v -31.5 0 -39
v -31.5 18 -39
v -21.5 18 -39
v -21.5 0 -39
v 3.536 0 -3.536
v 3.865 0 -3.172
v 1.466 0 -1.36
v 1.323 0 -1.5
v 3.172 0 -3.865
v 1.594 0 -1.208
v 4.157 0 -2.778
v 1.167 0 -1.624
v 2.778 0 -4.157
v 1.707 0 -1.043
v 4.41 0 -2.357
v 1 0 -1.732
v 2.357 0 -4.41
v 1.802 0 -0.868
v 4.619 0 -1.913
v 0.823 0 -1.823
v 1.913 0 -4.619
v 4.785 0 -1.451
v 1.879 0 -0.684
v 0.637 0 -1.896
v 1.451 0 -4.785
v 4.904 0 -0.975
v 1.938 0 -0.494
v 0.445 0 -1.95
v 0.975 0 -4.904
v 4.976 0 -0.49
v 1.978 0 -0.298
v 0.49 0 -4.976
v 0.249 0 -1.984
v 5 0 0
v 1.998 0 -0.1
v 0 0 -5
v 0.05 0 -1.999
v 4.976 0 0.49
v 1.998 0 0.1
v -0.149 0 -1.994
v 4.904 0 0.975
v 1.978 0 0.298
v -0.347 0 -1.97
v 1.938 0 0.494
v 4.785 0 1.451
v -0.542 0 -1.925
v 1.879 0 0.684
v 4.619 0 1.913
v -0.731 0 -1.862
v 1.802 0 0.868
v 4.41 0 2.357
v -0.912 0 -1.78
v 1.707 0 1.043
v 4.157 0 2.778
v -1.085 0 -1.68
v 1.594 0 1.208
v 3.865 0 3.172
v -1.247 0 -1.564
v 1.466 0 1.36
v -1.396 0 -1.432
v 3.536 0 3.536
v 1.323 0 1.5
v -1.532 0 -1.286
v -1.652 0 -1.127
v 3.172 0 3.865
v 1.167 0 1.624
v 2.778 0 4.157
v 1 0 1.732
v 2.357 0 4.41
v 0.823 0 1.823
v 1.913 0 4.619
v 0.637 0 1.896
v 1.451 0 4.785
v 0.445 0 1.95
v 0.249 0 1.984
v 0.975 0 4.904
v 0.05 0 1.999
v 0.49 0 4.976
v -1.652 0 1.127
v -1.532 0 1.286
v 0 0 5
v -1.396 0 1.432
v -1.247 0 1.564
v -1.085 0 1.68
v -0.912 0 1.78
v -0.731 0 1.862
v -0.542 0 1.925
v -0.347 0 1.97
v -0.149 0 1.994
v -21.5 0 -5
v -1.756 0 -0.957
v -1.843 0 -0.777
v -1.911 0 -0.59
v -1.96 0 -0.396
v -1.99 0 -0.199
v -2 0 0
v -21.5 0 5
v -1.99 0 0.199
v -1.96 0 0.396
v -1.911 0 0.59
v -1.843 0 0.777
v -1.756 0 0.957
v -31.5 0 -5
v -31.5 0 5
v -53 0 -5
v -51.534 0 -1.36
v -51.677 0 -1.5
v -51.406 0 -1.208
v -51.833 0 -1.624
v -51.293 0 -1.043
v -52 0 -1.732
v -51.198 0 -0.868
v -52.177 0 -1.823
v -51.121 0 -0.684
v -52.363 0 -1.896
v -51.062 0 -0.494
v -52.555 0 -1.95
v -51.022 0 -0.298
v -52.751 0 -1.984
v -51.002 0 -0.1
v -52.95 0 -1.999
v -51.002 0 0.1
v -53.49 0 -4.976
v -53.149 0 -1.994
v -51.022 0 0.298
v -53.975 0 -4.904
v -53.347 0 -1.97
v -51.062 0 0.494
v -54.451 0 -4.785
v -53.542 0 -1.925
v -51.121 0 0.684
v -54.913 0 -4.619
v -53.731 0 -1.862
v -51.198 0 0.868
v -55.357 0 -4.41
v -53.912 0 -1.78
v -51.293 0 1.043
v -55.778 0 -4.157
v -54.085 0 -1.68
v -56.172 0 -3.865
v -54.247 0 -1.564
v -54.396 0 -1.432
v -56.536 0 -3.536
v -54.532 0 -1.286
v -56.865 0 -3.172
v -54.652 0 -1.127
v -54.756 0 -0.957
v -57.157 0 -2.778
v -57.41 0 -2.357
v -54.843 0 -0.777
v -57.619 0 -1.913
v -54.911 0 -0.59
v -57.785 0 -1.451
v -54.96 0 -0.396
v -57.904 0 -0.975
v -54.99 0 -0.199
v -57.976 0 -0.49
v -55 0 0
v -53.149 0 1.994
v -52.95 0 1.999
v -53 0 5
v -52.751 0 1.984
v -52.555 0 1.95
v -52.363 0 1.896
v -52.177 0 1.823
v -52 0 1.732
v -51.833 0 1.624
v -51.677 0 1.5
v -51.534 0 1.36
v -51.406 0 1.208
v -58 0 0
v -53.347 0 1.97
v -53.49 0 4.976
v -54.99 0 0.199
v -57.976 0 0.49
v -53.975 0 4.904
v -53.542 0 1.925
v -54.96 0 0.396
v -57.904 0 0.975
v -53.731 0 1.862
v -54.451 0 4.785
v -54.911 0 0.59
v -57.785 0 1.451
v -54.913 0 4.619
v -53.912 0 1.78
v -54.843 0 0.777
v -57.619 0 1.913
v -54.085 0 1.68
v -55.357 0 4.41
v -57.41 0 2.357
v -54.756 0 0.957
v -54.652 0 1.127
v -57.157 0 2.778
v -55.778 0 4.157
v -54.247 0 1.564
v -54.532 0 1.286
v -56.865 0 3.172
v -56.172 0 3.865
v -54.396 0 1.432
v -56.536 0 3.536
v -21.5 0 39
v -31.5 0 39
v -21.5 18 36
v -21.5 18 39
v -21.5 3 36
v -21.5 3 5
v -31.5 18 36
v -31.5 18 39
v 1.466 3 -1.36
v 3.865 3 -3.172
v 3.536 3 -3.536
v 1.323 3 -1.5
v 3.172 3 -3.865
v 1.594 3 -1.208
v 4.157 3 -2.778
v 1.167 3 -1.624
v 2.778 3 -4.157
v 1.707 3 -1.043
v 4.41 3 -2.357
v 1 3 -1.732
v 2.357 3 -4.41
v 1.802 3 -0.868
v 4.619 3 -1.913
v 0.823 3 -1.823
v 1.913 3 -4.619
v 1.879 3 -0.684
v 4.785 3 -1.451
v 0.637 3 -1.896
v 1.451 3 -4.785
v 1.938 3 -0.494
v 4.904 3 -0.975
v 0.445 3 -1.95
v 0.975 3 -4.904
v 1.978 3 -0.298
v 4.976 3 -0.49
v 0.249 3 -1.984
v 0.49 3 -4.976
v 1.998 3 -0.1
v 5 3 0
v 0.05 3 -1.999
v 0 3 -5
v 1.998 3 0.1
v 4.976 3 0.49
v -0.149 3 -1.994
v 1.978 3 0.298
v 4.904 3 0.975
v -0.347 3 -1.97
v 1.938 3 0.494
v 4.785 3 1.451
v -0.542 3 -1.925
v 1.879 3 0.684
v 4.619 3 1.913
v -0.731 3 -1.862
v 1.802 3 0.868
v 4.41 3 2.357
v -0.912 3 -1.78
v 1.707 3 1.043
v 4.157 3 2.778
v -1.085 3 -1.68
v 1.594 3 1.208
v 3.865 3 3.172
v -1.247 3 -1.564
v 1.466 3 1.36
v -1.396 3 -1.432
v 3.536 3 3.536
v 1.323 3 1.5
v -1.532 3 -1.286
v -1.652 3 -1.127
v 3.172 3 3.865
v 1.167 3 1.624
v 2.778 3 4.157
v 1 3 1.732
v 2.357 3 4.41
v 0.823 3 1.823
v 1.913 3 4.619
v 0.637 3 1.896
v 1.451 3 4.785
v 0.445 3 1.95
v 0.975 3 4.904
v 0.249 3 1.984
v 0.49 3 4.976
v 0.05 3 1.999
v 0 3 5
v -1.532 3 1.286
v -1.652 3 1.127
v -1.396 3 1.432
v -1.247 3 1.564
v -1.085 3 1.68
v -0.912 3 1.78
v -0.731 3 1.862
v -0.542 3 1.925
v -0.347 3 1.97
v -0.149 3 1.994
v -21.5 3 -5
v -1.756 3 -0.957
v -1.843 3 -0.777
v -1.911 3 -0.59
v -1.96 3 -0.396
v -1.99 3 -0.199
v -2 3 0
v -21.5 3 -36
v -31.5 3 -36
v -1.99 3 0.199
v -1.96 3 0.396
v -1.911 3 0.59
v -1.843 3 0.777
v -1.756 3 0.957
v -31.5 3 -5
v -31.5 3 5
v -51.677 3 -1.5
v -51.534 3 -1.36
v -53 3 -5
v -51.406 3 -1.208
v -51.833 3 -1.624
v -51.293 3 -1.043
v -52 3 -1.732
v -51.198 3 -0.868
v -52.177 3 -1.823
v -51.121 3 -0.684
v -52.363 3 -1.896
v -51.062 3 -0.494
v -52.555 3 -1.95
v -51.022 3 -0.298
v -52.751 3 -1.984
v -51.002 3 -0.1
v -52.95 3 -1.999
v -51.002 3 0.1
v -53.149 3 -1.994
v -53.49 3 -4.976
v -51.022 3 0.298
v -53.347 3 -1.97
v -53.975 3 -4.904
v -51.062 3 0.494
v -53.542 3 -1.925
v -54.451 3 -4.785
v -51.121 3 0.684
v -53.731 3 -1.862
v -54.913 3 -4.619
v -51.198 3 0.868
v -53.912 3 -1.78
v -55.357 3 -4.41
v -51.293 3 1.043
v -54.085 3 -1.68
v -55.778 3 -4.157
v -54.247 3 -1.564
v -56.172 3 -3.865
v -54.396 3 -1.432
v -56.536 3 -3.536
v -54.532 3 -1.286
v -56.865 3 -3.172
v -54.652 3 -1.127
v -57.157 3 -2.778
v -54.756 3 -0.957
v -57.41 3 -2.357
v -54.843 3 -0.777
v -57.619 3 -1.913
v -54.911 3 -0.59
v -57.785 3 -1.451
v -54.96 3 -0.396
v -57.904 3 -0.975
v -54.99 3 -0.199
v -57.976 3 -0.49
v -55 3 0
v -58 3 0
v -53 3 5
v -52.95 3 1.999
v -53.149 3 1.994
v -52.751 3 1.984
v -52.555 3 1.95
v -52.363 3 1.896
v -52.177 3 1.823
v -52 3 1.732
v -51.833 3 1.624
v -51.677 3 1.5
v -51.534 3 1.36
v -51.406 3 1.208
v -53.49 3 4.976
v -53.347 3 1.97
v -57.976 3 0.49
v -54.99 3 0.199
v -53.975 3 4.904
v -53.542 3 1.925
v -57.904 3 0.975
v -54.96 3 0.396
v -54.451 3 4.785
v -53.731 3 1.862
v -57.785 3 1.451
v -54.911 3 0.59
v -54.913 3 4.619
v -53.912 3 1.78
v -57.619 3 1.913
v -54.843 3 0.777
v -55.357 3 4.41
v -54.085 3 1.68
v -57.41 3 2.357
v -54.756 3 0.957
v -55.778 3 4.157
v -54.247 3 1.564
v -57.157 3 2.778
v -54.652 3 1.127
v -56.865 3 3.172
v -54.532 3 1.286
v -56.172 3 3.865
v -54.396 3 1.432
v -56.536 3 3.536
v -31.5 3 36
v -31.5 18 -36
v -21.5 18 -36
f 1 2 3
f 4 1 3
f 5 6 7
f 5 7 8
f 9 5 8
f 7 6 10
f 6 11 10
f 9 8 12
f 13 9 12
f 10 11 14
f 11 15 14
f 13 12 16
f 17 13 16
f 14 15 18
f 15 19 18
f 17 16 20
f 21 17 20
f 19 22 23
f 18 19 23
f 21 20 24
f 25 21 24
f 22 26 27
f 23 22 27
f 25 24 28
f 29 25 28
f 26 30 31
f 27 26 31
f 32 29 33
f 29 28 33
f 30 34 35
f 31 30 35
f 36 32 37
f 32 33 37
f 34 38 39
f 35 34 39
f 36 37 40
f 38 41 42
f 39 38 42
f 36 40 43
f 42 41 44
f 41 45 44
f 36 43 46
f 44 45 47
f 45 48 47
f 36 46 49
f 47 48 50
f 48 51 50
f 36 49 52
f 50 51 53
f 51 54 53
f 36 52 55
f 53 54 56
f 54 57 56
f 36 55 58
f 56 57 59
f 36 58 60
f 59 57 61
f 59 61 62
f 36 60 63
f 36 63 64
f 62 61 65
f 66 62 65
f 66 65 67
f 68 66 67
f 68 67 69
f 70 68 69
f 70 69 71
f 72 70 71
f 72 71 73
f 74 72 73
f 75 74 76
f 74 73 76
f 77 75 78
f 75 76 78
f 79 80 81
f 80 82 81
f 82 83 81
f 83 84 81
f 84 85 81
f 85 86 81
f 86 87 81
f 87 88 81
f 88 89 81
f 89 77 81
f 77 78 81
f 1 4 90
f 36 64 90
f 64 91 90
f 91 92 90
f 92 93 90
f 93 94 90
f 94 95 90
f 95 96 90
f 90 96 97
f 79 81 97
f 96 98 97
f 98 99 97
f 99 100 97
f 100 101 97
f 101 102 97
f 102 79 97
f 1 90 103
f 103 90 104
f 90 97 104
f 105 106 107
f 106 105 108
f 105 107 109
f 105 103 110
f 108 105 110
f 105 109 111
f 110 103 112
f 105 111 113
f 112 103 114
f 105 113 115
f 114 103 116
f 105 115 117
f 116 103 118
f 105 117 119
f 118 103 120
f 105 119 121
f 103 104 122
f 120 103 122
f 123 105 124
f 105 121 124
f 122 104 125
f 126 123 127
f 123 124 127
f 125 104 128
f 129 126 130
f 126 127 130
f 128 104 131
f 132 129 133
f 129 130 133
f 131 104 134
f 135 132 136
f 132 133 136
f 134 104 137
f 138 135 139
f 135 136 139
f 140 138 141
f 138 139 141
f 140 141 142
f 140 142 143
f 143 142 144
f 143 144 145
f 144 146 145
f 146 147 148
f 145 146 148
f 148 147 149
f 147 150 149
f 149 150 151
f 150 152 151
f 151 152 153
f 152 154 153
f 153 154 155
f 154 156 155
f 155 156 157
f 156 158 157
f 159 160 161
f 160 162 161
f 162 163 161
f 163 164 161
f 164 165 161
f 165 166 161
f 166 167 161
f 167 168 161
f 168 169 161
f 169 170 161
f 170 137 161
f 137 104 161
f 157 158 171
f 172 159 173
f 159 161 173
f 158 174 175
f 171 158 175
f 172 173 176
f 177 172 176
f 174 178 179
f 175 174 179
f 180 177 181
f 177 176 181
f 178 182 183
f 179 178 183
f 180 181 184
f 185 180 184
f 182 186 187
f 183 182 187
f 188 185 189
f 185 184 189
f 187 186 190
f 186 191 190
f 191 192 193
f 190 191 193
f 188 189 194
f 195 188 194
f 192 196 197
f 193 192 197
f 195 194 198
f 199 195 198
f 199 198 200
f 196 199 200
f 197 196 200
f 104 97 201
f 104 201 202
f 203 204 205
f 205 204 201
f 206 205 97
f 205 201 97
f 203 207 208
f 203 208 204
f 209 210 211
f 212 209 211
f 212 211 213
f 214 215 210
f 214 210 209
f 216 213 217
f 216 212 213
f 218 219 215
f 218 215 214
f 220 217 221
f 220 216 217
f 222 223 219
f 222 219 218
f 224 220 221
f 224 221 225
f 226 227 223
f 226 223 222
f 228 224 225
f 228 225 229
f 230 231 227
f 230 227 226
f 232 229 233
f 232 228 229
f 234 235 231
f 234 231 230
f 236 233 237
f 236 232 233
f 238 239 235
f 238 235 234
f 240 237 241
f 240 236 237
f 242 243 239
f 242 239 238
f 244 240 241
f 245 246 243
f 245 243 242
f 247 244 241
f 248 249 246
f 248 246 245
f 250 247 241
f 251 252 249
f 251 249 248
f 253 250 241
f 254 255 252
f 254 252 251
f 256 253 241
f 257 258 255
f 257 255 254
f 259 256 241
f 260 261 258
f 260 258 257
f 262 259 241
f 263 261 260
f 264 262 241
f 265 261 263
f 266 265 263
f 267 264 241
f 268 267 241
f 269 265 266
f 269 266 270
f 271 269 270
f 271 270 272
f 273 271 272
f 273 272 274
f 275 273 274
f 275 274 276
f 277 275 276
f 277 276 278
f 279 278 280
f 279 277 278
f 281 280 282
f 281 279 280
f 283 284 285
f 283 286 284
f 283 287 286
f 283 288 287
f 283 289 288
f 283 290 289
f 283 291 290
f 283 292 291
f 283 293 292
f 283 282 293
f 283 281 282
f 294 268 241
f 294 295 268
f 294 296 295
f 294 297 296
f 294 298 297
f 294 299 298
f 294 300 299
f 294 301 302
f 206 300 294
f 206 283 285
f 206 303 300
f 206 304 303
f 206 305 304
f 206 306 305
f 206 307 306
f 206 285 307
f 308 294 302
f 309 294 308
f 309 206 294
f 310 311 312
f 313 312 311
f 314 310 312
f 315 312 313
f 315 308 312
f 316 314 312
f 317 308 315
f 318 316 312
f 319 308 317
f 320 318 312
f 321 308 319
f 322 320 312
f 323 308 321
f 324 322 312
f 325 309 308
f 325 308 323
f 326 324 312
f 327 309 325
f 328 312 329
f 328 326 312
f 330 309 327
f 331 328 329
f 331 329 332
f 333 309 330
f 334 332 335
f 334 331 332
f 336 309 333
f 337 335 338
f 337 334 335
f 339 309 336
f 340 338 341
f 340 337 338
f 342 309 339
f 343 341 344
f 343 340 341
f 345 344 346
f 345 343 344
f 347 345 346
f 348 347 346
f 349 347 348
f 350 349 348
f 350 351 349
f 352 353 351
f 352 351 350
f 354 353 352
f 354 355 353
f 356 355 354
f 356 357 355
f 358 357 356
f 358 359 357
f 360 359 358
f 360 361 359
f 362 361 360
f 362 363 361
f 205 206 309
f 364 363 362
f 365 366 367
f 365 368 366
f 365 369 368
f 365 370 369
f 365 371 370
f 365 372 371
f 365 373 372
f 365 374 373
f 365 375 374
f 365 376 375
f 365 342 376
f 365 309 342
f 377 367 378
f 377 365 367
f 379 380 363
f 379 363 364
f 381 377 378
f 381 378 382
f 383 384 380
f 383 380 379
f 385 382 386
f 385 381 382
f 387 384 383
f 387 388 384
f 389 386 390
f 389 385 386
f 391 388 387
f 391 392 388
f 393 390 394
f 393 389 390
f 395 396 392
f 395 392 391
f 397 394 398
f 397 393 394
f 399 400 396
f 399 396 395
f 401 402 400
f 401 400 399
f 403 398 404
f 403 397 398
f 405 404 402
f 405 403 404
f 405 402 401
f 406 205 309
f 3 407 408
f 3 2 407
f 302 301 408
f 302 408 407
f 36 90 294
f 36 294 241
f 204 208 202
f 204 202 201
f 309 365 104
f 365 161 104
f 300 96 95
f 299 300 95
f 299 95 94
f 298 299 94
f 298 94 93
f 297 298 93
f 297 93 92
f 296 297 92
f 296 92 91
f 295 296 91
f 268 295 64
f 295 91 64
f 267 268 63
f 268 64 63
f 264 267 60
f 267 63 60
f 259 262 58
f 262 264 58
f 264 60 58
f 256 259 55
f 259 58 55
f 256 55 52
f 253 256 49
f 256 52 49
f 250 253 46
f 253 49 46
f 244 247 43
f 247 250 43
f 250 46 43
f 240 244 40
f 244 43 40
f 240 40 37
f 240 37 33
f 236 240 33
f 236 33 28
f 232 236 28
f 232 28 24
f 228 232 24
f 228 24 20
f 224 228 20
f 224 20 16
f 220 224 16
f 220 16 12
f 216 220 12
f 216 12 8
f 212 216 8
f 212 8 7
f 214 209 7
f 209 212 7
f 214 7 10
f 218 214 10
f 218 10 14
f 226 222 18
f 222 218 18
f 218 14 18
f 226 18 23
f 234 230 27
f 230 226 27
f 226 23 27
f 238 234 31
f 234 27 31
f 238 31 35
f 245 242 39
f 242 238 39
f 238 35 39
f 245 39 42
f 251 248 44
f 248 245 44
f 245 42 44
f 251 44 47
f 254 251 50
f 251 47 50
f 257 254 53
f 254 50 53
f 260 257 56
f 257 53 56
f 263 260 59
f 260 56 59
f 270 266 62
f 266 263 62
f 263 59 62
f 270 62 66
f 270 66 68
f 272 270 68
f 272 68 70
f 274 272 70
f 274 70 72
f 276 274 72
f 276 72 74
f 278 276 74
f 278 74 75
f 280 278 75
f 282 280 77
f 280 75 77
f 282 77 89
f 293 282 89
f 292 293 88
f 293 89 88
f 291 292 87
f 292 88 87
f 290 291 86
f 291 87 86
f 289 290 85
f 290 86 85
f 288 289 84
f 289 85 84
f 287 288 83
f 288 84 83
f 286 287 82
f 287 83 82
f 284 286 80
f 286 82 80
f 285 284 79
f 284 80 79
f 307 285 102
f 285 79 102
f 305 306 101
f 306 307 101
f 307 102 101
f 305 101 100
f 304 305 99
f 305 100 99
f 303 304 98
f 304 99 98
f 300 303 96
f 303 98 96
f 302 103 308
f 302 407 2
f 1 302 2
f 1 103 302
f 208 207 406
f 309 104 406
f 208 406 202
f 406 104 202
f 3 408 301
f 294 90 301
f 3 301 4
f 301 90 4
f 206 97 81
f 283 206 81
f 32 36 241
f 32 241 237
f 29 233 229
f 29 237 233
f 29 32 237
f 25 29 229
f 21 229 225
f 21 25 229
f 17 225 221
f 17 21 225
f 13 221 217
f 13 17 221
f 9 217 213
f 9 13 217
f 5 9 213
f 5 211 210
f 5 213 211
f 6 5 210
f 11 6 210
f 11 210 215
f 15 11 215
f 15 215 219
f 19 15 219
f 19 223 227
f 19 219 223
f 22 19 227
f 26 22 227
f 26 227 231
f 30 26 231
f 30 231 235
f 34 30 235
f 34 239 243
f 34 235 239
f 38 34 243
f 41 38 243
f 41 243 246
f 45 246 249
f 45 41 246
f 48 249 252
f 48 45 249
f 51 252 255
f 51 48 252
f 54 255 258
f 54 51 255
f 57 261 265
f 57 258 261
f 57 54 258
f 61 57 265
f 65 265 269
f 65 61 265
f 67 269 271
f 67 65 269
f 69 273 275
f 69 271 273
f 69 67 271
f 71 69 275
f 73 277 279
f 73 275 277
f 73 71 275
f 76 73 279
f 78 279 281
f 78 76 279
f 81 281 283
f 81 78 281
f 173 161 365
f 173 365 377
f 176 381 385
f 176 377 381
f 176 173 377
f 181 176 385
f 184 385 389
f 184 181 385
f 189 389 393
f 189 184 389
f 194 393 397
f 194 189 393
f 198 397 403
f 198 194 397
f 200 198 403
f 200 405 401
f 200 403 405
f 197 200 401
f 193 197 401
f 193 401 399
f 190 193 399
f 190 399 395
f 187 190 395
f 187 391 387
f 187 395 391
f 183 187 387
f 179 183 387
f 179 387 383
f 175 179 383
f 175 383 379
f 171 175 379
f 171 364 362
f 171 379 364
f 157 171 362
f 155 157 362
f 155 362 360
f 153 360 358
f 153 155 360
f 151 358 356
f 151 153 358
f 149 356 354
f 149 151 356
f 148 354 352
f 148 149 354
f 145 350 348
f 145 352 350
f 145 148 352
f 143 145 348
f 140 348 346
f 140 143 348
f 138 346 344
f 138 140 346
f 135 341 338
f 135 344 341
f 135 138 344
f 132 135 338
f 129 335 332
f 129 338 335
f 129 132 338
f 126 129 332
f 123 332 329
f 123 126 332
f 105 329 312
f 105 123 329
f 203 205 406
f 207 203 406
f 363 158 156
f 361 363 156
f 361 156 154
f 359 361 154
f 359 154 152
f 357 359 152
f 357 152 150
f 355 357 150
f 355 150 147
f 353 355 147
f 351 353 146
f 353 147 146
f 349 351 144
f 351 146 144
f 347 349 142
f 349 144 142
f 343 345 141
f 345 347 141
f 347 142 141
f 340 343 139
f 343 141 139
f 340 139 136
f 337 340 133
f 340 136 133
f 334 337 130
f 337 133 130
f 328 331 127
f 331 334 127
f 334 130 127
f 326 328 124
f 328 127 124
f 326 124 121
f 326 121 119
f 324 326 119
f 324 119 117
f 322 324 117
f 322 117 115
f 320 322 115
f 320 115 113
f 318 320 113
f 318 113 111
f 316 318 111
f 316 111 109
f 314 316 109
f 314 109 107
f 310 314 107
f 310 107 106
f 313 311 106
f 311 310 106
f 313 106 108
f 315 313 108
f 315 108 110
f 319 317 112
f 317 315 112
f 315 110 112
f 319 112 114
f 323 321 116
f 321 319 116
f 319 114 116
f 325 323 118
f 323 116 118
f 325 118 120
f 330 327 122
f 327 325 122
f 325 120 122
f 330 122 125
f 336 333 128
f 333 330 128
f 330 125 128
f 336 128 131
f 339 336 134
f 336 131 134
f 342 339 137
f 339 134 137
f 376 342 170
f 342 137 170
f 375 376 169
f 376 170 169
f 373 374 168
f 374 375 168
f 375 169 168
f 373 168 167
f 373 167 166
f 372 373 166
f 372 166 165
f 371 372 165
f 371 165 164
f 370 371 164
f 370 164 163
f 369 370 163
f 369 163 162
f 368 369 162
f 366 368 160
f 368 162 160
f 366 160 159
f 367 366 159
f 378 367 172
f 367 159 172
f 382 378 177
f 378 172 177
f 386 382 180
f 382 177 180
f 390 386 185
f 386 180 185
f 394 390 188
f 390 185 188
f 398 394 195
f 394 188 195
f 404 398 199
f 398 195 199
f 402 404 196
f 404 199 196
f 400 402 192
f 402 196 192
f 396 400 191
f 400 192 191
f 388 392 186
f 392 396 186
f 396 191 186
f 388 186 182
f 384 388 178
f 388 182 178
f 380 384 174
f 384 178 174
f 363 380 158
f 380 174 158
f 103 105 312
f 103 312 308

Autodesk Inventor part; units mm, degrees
ref_plane "YZ Plane" through (0, 0, 0) normal (1, 0, 0) x (0, 1, 0)
ref_plane "XZ Plane" through (0, 0, 0) normal (0, 1, 0) x (-1, 0, 0)
ref_plane "XY Plane" through (0, 0, 0) normal (0, 0, 1) x (1, 0, 0)
sketch "Sketch1" plane through (0, 0, 0) normal (0, 1, 0) x (-1, 0, 0)
  circle A0 centre (0, 0) radius 2
  circle A1 centre (53, 0) radius 2
  arc A2 (53, -5) -> (53, 5) centre (53, 0) ccw
  arc A3 (0, 5) -> (0, -5) centre (0, 0) ccw
  line L0 (31.5, 37.5) -> (31.5, 5)
  line L1 (31.5, -5) -> (31.5, -39)
  line L2 (21.5, 37.5) -> (21.5, 5)
  line L3 (21.5, -5) -> (21.5, -39)
  line L4 (31.5, 39) -> (21.5, 39)
  line L5 (21.5, 39) -> (21.5, 36)
  line L6 (31.5, 36) -> (31.5, 39)
  line L7 (31.5, -39) -> (21.5, -39)
  line L8 (53, 5) -> (31.5, 5)
  line L9 (21.5, 5) -> (0, 5)
  line L10 (53, -5) -> (31.5, -5)
  line L11 (21.5, -5) -> (0, -5)
  dimension "d0" = 4
  dimension "d1" = 4
  dimension "d2" = 10
  dimension "d3" = 10
  dimension "d8" = 3
extrude "Extrusion1" add sketch "Sketch1" along normal blind 3
sketch "Sketch2" plane through (0, 3, 0) normal (0, 1, 0) x (1, 0, 0)
  circle A0 centre (-53, 0) radius 2 projected
  circle A1 centre (0, 0) radius 2 projected
  line L0 (-53, -5) -> (-31.5, -5) projected
  line L1 (-31.5, -5) -> (-31.5, -39) projected
  line L2 (-31.5, -39) -> (-21.5, -39) projected
  line L3 (-21.5, -39) -> (-21.5, -5) projected
  line L4 (-21.5, -5) -> (0, -5) projected
  arc A2 (0, -5) -> (0, 5) centre (0, 0) ccw projected
  line L5 (0, 5) -> (-21.5, 5) projected
  line L6 (-21.5, 5) -> (-21.5, 39) projected
  line L7 (-21.5, 39) -> (-31.5, 39) projected
  line L8 (-31.5, 39) -> (-31.5, 5) projected
  line L9 (-31.5, 5) -> (-53, 5) projected
  arc A3 (-53, 5) -> (-53, -5) centre (-53, 0) ccw projected
  line L10 (-21.5, 5) -> (-21.5, 39) projected
  line L11 (-31.5, 39) -> (-21.5, 39)
  line L12 (-21.5, 39) -> (-21.5, 36)
  line L13 (-21.5, 36) -> (-31.5, 36)
  line L14 (-31.5, 36) -> (-31.5, 39)
  line L15 (-21.5, -39) -> (-21.5, -5) projected
  line L16 (-31.5, -39) -> (-21.5, -39)
  line L17 (-21.5, -39) -> (-21.5, -36)
  line L18 (-21.5, -36) -> (-31.5, -36)
  line L19 (-31.5, -36) -> (-31.5, -39)
  dimension "d11" = 3
  dimension "d12" = 3
extrude "Extrusion2" add sketch "Sketch2" along normal blind 15 contours L18 L3 L2 L1 | L8 L7 L6 L13
properties part number "Battery Restraint"
